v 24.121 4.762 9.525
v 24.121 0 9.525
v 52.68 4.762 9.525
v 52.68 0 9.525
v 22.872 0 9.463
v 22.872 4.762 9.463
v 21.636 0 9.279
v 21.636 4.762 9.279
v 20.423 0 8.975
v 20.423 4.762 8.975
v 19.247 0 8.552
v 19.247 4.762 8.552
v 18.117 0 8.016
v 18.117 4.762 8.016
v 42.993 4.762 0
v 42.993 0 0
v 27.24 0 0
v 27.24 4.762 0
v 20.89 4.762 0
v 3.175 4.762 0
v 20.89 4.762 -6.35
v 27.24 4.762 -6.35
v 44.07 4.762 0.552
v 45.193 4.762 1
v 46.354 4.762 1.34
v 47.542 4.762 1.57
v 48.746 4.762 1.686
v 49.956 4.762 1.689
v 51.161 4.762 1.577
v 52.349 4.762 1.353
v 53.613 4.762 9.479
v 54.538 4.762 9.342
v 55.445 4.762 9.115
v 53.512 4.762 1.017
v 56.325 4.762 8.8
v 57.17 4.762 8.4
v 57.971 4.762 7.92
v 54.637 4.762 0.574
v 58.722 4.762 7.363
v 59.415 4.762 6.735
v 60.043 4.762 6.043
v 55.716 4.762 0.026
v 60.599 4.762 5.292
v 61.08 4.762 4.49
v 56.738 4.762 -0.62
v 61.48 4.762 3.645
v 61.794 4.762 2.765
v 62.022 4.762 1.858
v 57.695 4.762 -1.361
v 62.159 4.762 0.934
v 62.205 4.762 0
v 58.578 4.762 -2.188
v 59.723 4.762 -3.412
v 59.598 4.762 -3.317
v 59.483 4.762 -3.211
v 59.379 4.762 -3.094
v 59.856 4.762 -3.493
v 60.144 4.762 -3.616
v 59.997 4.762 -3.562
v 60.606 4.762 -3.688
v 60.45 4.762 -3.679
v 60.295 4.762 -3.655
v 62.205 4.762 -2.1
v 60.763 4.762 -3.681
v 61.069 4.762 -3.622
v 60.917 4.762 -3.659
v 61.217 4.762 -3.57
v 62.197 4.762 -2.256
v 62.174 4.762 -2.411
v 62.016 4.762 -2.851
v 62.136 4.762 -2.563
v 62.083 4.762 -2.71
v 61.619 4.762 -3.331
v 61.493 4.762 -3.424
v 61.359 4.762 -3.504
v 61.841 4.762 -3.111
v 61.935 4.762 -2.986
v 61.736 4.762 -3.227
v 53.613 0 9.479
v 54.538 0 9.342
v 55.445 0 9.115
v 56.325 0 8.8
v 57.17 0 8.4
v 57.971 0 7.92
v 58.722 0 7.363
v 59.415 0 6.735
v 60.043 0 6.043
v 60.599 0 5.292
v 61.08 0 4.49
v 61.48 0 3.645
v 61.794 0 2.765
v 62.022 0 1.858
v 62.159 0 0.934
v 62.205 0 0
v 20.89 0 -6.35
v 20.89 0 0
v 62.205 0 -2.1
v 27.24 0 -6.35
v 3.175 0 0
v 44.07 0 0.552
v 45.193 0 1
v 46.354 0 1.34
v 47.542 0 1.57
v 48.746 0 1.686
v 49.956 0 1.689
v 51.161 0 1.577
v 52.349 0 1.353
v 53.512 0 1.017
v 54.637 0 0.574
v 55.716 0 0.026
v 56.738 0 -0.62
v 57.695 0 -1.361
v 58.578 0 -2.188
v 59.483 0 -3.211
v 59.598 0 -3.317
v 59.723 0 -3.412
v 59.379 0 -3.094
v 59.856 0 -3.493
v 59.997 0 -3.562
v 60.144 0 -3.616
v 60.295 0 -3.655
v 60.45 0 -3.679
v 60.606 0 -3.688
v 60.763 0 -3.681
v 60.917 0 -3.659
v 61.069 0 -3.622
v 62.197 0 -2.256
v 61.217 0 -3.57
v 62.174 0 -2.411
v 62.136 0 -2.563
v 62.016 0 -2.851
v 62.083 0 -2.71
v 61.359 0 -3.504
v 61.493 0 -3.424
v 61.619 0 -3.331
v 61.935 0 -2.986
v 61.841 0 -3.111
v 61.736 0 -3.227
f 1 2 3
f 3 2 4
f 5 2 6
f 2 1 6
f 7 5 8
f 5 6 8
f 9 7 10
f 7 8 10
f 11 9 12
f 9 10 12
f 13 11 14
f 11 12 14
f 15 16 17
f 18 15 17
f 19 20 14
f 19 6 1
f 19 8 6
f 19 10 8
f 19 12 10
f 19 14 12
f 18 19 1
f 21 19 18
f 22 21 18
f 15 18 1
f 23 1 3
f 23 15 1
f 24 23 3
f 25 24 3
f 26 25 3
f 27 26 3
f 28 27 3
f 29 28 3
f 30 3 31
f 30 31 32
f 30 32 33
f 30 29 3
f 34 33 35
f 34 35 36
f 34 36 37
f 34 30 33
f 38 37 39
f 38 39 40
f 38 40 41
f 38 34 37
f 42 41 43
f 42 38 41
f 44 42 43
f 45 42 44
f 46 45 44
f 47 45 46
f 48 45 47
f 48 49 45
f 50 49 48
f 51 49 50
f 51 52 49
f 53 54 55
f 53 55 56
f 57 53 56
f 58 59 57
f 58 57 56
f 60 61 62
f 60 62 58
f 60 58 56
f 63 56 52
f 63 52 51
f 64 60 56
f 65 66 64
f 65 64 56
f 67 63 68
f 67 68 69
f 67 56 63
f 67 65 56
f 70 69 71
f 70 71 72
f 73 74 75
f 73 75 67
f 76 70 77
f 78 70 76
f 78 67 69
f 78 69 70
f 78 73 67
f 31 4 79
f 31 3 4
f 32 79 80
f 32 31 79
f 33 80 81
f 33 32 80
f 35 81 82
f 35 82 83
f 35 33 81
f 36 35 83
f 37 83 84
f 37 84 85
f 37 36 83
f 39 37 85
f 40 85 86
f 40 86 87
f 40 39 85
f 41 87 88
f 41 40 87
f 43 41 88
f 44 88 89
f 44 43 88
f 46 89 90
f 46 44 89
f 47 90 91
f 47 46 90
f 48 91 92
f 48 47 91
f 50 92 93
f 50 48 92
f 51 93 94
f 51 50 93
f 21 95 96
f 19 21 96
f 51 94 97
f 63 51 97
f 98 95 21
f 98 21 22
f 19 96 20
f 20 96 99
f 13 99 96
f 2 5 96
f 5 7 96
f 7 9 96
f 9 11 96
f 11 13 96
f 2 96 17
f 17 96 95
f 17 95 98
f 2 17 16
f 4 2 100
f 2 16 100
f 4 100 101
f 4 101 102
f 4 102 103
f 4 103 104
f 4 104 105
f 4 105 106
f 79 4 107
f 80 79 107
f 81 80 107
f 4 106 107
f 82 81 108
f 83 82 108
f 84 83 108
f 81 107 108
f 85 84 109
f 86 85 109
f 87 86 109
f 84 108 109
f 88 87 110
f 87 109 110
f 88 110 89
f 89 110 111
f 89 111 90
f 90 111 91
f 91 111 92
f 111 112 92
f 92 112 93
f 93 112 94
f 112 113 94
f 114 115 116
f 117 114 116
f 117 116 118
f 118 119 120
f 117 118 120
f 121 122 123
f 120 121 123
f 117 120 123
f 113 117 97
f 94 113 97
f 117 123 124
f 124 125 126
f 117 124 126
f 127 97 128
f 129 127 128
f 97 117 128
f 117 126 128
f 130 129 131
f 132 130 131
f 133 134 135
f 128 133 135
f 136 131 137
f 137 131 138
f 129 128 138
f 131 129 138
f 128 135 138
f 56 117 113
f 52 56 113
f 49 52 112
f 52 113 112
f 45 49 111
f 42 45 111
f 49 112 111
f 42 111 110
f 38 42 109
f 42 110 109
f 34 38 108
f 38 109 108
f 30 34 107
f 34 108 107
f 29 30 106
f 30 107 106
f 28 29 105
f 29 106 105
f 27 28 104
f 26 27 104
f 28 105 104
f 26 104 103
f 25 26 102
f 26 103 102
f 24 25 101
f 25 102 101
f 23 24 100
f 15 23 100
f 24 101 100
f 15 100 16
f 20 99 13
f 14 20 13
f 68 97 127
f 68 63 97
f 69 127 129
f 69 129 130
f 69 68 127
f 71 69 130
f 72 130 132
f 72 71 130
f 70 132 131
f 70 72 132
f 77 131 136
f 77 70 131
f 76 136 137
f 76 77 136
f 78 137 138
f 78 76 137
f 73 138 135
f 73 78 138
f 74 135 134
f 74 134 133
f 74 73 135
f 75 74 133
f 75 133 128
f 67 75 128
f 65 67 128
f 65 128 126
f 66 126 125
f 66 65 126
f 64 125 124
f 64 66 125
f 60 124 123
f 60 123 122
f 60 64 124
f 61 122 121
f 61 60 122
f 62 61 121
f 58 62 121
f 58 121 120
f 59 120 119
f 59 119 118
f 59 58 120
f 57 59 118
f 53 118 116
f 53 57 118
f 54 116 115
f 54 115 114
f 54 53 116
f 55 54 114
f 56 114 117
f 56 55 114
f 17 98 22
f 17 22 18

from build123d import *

# Parameters (mm, degrees)
BOSS_EXTRUDE1_DEPTH = 4.7625
FILLET1_R           = 9.525
FILLET2_R           = 1.5875
FILLET4_R           = 12.7
SKETCH2_W           = 6.35
SKETCH2_H           = 6.35
BOSS_EXTRUDE2_DEPTH = 4.7625


with BuildPart() as part:
    # Sketch1 → Boss-Extrude1 (new body)
    with BuildSketch(Plane(origin=(0, 0, 0), x_dir=(1, 0, 0), z_dir=(0, 1, 0))):
        with BuildLine():
            ThreePointArc((62.2046, 11.1252), (55.805583, 0.025067), (42.993099, 0))
            Line((42.993099, 0), (3.175, 0))
            Line((3.175, 0), (20.9296, -9.525))
            Line((20.9296, -9.525), (62.2046, -9.525))
            Line((62.2046, -9.525), (62.2046, 11.1252))
        make_face()
    extrude(amount=BOSS_EXTRUDE1_DEPTH)

    # Fillet1
    fillet1_edges = [part.edges().sort_by_distance(p)[0] for p in [
        (62.2046, 2.38125, 9.525),
    ]]
    fillet(fillet1_edges, radius=FILLET1_R)

    # Fillet2
    fillet2_edges = [part.edges().sort_by_distance(p)[0] for p in [
        (62.2046, 2.38125, -11.1252),
    ]]
    fillet(fillet2_edges, radius=FILLET2_R)

    # Fillet4
    fillet4_edges = [part.edges().sort_by_distance(p)[0] for p in [
        (20.9296, 2.38125, 9.525),
    ]]
    fillet(fillet4_edges, radius=FILLET4_R)

    # Sketch2 → Boss-Extrude2 (add)
    with BuildSketch(Plane.XZ):
        with Locations((24.0645, -3.175)):
            Rectangle(SKETCH2_W, SKETCH2_H)
    extrude(amount=-BOSS_EXTRUDE2_DEPTH)


solid = part.part
